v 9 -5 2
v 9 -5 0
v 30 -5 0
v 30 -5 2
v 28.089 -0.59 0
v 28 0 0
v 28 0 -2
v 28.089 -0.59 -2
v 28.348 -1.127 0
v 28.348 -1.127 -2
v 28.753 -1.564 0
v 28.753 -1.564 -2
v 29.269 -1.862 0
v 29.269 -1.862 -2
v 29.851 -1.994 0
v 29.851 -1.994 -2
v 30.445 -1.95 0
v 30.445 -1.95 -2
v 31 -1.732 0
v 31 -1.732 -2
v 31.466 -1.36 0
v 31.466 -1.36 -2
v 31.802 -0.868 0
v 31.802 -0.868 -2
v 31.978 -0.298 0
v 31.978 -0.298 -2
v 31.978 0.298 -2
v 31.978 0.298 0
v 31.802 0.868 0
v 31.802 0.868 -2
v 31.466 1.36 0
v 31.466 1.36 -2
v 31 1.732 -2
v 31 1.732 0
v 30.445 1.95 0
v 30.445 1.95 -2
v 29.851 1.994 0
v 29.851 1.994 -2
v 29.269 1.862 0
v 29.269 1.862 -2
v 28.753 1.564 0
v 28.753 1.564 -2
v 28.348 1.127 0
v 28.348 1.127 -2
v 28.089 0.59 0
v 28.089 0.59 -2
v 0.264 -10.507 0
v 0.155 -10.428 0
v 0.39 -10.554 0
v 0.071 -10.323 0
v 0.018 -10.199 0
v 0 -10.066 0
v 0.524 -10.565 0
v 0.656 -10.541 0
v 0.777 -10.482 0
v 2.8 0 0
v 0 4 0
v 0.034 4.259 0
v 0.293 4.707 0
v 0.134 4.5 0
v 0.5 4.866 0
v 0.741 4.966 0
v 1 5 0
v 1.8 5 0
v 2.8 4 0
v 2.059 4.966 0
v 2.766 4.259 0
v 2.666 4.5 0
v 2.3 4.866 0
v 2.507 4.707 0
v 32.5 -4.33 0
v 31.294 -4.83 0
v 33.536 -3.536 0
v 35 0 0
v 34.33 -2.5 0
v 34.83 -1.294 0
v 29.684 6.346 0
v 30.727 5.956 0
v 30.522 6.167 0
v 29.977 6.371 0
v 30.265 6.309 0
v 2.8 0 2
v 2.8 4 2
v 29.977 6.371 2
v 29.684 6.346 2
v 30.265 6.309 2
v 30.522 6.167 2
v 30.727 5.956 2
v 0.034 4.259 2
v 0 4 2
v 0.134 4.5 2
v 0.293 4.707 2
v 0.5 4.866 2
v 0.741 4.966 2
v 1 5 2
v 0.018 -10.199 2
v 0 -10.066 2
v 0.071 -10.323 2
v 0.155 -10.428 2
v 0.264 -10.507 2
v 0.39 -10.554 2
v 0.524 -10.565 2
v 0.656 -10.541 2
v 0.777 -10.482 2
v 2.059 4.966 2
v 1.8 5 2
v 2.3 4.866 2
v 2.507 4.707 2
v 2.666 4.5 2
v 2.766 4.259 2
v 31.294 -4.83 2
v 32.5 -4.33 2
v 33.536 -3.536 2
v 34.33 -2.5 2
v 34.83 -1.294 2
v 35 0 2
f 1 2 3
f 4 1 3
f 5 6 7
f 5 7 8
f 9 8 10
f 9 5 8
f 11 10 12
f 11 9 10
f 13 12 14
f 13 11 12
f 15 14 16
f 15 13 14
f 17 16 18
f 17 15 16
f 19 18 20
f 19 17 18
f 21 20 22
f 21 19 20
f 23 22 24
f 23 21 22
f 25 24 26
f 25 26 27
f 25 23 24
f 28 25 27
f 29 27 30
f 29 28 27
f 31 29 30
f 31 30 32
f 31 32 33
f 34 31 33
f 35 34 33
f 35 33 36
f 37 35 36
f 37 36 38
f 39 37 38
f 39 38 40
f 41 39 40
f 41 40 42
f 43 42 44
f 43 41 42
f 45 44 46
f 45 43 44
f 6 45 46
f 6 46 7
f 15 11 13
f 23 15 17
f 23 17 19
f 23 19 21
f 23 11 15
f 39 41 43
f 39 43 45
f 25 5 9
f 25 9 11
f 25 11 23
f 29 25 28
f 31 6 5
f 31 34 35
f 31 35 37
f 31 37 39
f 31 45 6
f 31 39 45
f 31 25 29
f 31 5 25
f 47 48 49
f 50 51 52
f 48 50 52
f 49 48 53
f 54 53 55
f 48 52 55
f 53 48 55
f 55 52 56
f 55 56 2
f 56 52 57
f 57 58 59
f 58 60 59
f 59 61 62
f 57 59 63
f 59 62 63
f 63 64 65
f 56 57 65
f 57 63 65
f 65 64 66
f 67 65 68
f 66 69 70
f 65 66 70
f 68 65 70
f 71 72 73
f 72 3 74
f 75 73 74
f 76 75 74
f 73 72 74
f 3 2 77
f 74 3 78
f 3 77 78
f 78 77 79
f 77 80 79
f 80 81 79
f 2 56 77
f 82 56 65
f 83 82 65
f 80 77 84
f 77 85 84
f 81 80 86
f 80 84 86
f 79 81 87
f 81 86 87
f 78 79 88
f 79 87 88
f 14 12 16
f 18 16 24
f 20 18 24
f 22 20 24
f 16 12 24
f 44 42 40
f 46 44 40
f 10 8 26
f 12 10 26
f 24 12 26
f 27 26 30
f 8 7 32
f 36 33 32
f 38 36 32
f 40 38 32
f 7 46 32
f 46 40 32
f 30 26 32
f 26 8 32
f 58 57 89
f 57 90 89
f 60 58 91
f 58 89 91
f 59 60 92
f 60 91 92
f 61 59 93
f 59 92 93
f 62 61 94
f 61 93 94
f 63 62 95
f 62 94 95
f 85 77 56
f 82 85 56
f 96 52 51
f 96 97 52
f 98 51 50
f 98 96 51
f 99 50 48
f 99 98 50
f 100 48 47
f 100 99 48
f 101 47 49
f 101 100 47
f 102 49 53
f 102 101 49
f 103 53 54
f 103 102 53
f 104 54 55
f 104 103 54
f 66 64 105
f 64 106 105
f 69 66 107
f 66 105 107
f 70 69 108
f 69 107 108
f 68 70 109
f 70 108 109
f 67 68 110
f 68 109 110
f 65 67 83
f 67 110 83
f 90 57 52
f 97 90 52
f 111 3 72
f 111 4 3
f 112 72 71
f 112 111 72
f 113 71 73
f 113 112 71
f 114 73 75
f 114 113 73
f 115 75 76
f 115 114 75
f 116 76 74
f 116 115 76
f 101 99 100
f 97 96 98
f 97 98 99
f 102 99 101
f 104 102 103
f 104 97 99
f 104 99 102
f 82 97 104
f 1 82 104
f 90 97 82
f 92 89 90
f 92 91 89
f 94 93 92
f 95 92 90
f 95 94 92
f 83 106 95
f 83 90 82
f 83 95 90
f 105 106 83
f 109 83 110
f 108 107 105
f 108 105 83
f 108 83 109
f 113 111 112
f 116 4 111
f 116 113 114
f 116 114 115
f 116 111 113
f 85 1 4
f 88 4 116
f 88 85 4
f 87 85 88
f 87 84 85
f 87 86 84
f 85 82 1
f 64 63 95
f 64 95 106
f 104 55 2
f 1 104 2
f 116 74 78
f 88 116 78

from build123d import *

# Parameters (mm, degrees)
F0_W     = 2.8
F0_H     = 5
F1_DEPTH = 2
F2_DEPTH = 2
F3_R     = 4.99999
F4_R     = 1
F5_R     = 1
F6_R     = 0.5


# Not quite as in the source:
# - a fillet or chamfer is up to 0.001 mm smaller than in the source, because OpenCascade refuses the exact size


with BuildPart() as f1:
    # F0 (on Top) → F1 (new body)
    with BuildSketch(Plane.XY):
        with BuildLine():
            Line((2.8, 0), (0, 0))
            Line((0, 0), (0, -5))
            Line((0, -5), (9, -5))
            Line((9, -5), (35, -5))
            Line((35, -5), (35, 0))
            Line((35, 0), (32, 0))
            ThreePointArc((32, 0), (30, -2), (28, 0))
            Line((28, 0), (2.8, 0))
        make_face()
        Polygon((9, -5), (0, -5), (0, -11), align=None)
        with BuildLine():
            Line((30.3363104735, 6.5), (2.8, 0))
            Line((2.8, 0), (28, 0))
            ThreePointArc((28, 0), (30, 2), (32, 0))
            Line((32, 0), (35, 0))
            Line((35, 0), (30.3363104735, 6.5))
        make_face()
        with Locations((1.4, 2.5)):
            Rectangle(F0_W, F0_H)
        with BuildLine():
            ThreePointArc((32, 0), (30, 2), (28, 0))
            Line((28, 0), (32, 0))
        make_face()
        with BuildLine():
            Line((32, 0), (28, 0))
            ThreePointArc((28, 0), (30, -2), (32, 0))
        make_face()
    extrude(amount=F1_DEPTH)

    # F3 (radius 5 in the source; OpenCascade refuses exactly that, so slightly less here)
    f3_edges = [f1.edges().sort_by_distance(p)[0] for p in [
        (35, -5, 1),
    ]]
    fillet(f3_edges, radius=F3_R)

    # F4
    f4_edges = [f1.edges().sort_by_distance(p)[0] for p in [
        (0, 5, 1),
        (2.8, 5, 1),
    ]]
    fillet(f4_edges, radius=F4_R)

    # F5
    f5_edges = [f1.edges().sort_by_distance(p)[0] for p in [
        (30.33631, 6.5, 1),
    ]]
    fillet(f5_edges, radius=F5_R)

    # F6
    f6_edges = [f1.edges().sort_by_distance(p)[0] for p in [
        (0, -11, 1),
    ]]
    fillet(f6_edges, radius=F6_R)


with BuildPart() as f2:
    # F0 (on Top) → F2 (new body)
    with BuildSketch(Plane.XY):
        with BuildLine():
            ThreePointArc((32, 0), (30, 2), (28, 0))
            Line((28, 0), (32, 0))
        make_face()
        with BuildLine():
            Line((32, 0), (28, 0))
            ThreePointArc((28, 0), (30, -2), (32, 0))
        make_face()
    extrude(amount=-F2_DEPTH)


solid = Compound([f1.part, f2.part])
